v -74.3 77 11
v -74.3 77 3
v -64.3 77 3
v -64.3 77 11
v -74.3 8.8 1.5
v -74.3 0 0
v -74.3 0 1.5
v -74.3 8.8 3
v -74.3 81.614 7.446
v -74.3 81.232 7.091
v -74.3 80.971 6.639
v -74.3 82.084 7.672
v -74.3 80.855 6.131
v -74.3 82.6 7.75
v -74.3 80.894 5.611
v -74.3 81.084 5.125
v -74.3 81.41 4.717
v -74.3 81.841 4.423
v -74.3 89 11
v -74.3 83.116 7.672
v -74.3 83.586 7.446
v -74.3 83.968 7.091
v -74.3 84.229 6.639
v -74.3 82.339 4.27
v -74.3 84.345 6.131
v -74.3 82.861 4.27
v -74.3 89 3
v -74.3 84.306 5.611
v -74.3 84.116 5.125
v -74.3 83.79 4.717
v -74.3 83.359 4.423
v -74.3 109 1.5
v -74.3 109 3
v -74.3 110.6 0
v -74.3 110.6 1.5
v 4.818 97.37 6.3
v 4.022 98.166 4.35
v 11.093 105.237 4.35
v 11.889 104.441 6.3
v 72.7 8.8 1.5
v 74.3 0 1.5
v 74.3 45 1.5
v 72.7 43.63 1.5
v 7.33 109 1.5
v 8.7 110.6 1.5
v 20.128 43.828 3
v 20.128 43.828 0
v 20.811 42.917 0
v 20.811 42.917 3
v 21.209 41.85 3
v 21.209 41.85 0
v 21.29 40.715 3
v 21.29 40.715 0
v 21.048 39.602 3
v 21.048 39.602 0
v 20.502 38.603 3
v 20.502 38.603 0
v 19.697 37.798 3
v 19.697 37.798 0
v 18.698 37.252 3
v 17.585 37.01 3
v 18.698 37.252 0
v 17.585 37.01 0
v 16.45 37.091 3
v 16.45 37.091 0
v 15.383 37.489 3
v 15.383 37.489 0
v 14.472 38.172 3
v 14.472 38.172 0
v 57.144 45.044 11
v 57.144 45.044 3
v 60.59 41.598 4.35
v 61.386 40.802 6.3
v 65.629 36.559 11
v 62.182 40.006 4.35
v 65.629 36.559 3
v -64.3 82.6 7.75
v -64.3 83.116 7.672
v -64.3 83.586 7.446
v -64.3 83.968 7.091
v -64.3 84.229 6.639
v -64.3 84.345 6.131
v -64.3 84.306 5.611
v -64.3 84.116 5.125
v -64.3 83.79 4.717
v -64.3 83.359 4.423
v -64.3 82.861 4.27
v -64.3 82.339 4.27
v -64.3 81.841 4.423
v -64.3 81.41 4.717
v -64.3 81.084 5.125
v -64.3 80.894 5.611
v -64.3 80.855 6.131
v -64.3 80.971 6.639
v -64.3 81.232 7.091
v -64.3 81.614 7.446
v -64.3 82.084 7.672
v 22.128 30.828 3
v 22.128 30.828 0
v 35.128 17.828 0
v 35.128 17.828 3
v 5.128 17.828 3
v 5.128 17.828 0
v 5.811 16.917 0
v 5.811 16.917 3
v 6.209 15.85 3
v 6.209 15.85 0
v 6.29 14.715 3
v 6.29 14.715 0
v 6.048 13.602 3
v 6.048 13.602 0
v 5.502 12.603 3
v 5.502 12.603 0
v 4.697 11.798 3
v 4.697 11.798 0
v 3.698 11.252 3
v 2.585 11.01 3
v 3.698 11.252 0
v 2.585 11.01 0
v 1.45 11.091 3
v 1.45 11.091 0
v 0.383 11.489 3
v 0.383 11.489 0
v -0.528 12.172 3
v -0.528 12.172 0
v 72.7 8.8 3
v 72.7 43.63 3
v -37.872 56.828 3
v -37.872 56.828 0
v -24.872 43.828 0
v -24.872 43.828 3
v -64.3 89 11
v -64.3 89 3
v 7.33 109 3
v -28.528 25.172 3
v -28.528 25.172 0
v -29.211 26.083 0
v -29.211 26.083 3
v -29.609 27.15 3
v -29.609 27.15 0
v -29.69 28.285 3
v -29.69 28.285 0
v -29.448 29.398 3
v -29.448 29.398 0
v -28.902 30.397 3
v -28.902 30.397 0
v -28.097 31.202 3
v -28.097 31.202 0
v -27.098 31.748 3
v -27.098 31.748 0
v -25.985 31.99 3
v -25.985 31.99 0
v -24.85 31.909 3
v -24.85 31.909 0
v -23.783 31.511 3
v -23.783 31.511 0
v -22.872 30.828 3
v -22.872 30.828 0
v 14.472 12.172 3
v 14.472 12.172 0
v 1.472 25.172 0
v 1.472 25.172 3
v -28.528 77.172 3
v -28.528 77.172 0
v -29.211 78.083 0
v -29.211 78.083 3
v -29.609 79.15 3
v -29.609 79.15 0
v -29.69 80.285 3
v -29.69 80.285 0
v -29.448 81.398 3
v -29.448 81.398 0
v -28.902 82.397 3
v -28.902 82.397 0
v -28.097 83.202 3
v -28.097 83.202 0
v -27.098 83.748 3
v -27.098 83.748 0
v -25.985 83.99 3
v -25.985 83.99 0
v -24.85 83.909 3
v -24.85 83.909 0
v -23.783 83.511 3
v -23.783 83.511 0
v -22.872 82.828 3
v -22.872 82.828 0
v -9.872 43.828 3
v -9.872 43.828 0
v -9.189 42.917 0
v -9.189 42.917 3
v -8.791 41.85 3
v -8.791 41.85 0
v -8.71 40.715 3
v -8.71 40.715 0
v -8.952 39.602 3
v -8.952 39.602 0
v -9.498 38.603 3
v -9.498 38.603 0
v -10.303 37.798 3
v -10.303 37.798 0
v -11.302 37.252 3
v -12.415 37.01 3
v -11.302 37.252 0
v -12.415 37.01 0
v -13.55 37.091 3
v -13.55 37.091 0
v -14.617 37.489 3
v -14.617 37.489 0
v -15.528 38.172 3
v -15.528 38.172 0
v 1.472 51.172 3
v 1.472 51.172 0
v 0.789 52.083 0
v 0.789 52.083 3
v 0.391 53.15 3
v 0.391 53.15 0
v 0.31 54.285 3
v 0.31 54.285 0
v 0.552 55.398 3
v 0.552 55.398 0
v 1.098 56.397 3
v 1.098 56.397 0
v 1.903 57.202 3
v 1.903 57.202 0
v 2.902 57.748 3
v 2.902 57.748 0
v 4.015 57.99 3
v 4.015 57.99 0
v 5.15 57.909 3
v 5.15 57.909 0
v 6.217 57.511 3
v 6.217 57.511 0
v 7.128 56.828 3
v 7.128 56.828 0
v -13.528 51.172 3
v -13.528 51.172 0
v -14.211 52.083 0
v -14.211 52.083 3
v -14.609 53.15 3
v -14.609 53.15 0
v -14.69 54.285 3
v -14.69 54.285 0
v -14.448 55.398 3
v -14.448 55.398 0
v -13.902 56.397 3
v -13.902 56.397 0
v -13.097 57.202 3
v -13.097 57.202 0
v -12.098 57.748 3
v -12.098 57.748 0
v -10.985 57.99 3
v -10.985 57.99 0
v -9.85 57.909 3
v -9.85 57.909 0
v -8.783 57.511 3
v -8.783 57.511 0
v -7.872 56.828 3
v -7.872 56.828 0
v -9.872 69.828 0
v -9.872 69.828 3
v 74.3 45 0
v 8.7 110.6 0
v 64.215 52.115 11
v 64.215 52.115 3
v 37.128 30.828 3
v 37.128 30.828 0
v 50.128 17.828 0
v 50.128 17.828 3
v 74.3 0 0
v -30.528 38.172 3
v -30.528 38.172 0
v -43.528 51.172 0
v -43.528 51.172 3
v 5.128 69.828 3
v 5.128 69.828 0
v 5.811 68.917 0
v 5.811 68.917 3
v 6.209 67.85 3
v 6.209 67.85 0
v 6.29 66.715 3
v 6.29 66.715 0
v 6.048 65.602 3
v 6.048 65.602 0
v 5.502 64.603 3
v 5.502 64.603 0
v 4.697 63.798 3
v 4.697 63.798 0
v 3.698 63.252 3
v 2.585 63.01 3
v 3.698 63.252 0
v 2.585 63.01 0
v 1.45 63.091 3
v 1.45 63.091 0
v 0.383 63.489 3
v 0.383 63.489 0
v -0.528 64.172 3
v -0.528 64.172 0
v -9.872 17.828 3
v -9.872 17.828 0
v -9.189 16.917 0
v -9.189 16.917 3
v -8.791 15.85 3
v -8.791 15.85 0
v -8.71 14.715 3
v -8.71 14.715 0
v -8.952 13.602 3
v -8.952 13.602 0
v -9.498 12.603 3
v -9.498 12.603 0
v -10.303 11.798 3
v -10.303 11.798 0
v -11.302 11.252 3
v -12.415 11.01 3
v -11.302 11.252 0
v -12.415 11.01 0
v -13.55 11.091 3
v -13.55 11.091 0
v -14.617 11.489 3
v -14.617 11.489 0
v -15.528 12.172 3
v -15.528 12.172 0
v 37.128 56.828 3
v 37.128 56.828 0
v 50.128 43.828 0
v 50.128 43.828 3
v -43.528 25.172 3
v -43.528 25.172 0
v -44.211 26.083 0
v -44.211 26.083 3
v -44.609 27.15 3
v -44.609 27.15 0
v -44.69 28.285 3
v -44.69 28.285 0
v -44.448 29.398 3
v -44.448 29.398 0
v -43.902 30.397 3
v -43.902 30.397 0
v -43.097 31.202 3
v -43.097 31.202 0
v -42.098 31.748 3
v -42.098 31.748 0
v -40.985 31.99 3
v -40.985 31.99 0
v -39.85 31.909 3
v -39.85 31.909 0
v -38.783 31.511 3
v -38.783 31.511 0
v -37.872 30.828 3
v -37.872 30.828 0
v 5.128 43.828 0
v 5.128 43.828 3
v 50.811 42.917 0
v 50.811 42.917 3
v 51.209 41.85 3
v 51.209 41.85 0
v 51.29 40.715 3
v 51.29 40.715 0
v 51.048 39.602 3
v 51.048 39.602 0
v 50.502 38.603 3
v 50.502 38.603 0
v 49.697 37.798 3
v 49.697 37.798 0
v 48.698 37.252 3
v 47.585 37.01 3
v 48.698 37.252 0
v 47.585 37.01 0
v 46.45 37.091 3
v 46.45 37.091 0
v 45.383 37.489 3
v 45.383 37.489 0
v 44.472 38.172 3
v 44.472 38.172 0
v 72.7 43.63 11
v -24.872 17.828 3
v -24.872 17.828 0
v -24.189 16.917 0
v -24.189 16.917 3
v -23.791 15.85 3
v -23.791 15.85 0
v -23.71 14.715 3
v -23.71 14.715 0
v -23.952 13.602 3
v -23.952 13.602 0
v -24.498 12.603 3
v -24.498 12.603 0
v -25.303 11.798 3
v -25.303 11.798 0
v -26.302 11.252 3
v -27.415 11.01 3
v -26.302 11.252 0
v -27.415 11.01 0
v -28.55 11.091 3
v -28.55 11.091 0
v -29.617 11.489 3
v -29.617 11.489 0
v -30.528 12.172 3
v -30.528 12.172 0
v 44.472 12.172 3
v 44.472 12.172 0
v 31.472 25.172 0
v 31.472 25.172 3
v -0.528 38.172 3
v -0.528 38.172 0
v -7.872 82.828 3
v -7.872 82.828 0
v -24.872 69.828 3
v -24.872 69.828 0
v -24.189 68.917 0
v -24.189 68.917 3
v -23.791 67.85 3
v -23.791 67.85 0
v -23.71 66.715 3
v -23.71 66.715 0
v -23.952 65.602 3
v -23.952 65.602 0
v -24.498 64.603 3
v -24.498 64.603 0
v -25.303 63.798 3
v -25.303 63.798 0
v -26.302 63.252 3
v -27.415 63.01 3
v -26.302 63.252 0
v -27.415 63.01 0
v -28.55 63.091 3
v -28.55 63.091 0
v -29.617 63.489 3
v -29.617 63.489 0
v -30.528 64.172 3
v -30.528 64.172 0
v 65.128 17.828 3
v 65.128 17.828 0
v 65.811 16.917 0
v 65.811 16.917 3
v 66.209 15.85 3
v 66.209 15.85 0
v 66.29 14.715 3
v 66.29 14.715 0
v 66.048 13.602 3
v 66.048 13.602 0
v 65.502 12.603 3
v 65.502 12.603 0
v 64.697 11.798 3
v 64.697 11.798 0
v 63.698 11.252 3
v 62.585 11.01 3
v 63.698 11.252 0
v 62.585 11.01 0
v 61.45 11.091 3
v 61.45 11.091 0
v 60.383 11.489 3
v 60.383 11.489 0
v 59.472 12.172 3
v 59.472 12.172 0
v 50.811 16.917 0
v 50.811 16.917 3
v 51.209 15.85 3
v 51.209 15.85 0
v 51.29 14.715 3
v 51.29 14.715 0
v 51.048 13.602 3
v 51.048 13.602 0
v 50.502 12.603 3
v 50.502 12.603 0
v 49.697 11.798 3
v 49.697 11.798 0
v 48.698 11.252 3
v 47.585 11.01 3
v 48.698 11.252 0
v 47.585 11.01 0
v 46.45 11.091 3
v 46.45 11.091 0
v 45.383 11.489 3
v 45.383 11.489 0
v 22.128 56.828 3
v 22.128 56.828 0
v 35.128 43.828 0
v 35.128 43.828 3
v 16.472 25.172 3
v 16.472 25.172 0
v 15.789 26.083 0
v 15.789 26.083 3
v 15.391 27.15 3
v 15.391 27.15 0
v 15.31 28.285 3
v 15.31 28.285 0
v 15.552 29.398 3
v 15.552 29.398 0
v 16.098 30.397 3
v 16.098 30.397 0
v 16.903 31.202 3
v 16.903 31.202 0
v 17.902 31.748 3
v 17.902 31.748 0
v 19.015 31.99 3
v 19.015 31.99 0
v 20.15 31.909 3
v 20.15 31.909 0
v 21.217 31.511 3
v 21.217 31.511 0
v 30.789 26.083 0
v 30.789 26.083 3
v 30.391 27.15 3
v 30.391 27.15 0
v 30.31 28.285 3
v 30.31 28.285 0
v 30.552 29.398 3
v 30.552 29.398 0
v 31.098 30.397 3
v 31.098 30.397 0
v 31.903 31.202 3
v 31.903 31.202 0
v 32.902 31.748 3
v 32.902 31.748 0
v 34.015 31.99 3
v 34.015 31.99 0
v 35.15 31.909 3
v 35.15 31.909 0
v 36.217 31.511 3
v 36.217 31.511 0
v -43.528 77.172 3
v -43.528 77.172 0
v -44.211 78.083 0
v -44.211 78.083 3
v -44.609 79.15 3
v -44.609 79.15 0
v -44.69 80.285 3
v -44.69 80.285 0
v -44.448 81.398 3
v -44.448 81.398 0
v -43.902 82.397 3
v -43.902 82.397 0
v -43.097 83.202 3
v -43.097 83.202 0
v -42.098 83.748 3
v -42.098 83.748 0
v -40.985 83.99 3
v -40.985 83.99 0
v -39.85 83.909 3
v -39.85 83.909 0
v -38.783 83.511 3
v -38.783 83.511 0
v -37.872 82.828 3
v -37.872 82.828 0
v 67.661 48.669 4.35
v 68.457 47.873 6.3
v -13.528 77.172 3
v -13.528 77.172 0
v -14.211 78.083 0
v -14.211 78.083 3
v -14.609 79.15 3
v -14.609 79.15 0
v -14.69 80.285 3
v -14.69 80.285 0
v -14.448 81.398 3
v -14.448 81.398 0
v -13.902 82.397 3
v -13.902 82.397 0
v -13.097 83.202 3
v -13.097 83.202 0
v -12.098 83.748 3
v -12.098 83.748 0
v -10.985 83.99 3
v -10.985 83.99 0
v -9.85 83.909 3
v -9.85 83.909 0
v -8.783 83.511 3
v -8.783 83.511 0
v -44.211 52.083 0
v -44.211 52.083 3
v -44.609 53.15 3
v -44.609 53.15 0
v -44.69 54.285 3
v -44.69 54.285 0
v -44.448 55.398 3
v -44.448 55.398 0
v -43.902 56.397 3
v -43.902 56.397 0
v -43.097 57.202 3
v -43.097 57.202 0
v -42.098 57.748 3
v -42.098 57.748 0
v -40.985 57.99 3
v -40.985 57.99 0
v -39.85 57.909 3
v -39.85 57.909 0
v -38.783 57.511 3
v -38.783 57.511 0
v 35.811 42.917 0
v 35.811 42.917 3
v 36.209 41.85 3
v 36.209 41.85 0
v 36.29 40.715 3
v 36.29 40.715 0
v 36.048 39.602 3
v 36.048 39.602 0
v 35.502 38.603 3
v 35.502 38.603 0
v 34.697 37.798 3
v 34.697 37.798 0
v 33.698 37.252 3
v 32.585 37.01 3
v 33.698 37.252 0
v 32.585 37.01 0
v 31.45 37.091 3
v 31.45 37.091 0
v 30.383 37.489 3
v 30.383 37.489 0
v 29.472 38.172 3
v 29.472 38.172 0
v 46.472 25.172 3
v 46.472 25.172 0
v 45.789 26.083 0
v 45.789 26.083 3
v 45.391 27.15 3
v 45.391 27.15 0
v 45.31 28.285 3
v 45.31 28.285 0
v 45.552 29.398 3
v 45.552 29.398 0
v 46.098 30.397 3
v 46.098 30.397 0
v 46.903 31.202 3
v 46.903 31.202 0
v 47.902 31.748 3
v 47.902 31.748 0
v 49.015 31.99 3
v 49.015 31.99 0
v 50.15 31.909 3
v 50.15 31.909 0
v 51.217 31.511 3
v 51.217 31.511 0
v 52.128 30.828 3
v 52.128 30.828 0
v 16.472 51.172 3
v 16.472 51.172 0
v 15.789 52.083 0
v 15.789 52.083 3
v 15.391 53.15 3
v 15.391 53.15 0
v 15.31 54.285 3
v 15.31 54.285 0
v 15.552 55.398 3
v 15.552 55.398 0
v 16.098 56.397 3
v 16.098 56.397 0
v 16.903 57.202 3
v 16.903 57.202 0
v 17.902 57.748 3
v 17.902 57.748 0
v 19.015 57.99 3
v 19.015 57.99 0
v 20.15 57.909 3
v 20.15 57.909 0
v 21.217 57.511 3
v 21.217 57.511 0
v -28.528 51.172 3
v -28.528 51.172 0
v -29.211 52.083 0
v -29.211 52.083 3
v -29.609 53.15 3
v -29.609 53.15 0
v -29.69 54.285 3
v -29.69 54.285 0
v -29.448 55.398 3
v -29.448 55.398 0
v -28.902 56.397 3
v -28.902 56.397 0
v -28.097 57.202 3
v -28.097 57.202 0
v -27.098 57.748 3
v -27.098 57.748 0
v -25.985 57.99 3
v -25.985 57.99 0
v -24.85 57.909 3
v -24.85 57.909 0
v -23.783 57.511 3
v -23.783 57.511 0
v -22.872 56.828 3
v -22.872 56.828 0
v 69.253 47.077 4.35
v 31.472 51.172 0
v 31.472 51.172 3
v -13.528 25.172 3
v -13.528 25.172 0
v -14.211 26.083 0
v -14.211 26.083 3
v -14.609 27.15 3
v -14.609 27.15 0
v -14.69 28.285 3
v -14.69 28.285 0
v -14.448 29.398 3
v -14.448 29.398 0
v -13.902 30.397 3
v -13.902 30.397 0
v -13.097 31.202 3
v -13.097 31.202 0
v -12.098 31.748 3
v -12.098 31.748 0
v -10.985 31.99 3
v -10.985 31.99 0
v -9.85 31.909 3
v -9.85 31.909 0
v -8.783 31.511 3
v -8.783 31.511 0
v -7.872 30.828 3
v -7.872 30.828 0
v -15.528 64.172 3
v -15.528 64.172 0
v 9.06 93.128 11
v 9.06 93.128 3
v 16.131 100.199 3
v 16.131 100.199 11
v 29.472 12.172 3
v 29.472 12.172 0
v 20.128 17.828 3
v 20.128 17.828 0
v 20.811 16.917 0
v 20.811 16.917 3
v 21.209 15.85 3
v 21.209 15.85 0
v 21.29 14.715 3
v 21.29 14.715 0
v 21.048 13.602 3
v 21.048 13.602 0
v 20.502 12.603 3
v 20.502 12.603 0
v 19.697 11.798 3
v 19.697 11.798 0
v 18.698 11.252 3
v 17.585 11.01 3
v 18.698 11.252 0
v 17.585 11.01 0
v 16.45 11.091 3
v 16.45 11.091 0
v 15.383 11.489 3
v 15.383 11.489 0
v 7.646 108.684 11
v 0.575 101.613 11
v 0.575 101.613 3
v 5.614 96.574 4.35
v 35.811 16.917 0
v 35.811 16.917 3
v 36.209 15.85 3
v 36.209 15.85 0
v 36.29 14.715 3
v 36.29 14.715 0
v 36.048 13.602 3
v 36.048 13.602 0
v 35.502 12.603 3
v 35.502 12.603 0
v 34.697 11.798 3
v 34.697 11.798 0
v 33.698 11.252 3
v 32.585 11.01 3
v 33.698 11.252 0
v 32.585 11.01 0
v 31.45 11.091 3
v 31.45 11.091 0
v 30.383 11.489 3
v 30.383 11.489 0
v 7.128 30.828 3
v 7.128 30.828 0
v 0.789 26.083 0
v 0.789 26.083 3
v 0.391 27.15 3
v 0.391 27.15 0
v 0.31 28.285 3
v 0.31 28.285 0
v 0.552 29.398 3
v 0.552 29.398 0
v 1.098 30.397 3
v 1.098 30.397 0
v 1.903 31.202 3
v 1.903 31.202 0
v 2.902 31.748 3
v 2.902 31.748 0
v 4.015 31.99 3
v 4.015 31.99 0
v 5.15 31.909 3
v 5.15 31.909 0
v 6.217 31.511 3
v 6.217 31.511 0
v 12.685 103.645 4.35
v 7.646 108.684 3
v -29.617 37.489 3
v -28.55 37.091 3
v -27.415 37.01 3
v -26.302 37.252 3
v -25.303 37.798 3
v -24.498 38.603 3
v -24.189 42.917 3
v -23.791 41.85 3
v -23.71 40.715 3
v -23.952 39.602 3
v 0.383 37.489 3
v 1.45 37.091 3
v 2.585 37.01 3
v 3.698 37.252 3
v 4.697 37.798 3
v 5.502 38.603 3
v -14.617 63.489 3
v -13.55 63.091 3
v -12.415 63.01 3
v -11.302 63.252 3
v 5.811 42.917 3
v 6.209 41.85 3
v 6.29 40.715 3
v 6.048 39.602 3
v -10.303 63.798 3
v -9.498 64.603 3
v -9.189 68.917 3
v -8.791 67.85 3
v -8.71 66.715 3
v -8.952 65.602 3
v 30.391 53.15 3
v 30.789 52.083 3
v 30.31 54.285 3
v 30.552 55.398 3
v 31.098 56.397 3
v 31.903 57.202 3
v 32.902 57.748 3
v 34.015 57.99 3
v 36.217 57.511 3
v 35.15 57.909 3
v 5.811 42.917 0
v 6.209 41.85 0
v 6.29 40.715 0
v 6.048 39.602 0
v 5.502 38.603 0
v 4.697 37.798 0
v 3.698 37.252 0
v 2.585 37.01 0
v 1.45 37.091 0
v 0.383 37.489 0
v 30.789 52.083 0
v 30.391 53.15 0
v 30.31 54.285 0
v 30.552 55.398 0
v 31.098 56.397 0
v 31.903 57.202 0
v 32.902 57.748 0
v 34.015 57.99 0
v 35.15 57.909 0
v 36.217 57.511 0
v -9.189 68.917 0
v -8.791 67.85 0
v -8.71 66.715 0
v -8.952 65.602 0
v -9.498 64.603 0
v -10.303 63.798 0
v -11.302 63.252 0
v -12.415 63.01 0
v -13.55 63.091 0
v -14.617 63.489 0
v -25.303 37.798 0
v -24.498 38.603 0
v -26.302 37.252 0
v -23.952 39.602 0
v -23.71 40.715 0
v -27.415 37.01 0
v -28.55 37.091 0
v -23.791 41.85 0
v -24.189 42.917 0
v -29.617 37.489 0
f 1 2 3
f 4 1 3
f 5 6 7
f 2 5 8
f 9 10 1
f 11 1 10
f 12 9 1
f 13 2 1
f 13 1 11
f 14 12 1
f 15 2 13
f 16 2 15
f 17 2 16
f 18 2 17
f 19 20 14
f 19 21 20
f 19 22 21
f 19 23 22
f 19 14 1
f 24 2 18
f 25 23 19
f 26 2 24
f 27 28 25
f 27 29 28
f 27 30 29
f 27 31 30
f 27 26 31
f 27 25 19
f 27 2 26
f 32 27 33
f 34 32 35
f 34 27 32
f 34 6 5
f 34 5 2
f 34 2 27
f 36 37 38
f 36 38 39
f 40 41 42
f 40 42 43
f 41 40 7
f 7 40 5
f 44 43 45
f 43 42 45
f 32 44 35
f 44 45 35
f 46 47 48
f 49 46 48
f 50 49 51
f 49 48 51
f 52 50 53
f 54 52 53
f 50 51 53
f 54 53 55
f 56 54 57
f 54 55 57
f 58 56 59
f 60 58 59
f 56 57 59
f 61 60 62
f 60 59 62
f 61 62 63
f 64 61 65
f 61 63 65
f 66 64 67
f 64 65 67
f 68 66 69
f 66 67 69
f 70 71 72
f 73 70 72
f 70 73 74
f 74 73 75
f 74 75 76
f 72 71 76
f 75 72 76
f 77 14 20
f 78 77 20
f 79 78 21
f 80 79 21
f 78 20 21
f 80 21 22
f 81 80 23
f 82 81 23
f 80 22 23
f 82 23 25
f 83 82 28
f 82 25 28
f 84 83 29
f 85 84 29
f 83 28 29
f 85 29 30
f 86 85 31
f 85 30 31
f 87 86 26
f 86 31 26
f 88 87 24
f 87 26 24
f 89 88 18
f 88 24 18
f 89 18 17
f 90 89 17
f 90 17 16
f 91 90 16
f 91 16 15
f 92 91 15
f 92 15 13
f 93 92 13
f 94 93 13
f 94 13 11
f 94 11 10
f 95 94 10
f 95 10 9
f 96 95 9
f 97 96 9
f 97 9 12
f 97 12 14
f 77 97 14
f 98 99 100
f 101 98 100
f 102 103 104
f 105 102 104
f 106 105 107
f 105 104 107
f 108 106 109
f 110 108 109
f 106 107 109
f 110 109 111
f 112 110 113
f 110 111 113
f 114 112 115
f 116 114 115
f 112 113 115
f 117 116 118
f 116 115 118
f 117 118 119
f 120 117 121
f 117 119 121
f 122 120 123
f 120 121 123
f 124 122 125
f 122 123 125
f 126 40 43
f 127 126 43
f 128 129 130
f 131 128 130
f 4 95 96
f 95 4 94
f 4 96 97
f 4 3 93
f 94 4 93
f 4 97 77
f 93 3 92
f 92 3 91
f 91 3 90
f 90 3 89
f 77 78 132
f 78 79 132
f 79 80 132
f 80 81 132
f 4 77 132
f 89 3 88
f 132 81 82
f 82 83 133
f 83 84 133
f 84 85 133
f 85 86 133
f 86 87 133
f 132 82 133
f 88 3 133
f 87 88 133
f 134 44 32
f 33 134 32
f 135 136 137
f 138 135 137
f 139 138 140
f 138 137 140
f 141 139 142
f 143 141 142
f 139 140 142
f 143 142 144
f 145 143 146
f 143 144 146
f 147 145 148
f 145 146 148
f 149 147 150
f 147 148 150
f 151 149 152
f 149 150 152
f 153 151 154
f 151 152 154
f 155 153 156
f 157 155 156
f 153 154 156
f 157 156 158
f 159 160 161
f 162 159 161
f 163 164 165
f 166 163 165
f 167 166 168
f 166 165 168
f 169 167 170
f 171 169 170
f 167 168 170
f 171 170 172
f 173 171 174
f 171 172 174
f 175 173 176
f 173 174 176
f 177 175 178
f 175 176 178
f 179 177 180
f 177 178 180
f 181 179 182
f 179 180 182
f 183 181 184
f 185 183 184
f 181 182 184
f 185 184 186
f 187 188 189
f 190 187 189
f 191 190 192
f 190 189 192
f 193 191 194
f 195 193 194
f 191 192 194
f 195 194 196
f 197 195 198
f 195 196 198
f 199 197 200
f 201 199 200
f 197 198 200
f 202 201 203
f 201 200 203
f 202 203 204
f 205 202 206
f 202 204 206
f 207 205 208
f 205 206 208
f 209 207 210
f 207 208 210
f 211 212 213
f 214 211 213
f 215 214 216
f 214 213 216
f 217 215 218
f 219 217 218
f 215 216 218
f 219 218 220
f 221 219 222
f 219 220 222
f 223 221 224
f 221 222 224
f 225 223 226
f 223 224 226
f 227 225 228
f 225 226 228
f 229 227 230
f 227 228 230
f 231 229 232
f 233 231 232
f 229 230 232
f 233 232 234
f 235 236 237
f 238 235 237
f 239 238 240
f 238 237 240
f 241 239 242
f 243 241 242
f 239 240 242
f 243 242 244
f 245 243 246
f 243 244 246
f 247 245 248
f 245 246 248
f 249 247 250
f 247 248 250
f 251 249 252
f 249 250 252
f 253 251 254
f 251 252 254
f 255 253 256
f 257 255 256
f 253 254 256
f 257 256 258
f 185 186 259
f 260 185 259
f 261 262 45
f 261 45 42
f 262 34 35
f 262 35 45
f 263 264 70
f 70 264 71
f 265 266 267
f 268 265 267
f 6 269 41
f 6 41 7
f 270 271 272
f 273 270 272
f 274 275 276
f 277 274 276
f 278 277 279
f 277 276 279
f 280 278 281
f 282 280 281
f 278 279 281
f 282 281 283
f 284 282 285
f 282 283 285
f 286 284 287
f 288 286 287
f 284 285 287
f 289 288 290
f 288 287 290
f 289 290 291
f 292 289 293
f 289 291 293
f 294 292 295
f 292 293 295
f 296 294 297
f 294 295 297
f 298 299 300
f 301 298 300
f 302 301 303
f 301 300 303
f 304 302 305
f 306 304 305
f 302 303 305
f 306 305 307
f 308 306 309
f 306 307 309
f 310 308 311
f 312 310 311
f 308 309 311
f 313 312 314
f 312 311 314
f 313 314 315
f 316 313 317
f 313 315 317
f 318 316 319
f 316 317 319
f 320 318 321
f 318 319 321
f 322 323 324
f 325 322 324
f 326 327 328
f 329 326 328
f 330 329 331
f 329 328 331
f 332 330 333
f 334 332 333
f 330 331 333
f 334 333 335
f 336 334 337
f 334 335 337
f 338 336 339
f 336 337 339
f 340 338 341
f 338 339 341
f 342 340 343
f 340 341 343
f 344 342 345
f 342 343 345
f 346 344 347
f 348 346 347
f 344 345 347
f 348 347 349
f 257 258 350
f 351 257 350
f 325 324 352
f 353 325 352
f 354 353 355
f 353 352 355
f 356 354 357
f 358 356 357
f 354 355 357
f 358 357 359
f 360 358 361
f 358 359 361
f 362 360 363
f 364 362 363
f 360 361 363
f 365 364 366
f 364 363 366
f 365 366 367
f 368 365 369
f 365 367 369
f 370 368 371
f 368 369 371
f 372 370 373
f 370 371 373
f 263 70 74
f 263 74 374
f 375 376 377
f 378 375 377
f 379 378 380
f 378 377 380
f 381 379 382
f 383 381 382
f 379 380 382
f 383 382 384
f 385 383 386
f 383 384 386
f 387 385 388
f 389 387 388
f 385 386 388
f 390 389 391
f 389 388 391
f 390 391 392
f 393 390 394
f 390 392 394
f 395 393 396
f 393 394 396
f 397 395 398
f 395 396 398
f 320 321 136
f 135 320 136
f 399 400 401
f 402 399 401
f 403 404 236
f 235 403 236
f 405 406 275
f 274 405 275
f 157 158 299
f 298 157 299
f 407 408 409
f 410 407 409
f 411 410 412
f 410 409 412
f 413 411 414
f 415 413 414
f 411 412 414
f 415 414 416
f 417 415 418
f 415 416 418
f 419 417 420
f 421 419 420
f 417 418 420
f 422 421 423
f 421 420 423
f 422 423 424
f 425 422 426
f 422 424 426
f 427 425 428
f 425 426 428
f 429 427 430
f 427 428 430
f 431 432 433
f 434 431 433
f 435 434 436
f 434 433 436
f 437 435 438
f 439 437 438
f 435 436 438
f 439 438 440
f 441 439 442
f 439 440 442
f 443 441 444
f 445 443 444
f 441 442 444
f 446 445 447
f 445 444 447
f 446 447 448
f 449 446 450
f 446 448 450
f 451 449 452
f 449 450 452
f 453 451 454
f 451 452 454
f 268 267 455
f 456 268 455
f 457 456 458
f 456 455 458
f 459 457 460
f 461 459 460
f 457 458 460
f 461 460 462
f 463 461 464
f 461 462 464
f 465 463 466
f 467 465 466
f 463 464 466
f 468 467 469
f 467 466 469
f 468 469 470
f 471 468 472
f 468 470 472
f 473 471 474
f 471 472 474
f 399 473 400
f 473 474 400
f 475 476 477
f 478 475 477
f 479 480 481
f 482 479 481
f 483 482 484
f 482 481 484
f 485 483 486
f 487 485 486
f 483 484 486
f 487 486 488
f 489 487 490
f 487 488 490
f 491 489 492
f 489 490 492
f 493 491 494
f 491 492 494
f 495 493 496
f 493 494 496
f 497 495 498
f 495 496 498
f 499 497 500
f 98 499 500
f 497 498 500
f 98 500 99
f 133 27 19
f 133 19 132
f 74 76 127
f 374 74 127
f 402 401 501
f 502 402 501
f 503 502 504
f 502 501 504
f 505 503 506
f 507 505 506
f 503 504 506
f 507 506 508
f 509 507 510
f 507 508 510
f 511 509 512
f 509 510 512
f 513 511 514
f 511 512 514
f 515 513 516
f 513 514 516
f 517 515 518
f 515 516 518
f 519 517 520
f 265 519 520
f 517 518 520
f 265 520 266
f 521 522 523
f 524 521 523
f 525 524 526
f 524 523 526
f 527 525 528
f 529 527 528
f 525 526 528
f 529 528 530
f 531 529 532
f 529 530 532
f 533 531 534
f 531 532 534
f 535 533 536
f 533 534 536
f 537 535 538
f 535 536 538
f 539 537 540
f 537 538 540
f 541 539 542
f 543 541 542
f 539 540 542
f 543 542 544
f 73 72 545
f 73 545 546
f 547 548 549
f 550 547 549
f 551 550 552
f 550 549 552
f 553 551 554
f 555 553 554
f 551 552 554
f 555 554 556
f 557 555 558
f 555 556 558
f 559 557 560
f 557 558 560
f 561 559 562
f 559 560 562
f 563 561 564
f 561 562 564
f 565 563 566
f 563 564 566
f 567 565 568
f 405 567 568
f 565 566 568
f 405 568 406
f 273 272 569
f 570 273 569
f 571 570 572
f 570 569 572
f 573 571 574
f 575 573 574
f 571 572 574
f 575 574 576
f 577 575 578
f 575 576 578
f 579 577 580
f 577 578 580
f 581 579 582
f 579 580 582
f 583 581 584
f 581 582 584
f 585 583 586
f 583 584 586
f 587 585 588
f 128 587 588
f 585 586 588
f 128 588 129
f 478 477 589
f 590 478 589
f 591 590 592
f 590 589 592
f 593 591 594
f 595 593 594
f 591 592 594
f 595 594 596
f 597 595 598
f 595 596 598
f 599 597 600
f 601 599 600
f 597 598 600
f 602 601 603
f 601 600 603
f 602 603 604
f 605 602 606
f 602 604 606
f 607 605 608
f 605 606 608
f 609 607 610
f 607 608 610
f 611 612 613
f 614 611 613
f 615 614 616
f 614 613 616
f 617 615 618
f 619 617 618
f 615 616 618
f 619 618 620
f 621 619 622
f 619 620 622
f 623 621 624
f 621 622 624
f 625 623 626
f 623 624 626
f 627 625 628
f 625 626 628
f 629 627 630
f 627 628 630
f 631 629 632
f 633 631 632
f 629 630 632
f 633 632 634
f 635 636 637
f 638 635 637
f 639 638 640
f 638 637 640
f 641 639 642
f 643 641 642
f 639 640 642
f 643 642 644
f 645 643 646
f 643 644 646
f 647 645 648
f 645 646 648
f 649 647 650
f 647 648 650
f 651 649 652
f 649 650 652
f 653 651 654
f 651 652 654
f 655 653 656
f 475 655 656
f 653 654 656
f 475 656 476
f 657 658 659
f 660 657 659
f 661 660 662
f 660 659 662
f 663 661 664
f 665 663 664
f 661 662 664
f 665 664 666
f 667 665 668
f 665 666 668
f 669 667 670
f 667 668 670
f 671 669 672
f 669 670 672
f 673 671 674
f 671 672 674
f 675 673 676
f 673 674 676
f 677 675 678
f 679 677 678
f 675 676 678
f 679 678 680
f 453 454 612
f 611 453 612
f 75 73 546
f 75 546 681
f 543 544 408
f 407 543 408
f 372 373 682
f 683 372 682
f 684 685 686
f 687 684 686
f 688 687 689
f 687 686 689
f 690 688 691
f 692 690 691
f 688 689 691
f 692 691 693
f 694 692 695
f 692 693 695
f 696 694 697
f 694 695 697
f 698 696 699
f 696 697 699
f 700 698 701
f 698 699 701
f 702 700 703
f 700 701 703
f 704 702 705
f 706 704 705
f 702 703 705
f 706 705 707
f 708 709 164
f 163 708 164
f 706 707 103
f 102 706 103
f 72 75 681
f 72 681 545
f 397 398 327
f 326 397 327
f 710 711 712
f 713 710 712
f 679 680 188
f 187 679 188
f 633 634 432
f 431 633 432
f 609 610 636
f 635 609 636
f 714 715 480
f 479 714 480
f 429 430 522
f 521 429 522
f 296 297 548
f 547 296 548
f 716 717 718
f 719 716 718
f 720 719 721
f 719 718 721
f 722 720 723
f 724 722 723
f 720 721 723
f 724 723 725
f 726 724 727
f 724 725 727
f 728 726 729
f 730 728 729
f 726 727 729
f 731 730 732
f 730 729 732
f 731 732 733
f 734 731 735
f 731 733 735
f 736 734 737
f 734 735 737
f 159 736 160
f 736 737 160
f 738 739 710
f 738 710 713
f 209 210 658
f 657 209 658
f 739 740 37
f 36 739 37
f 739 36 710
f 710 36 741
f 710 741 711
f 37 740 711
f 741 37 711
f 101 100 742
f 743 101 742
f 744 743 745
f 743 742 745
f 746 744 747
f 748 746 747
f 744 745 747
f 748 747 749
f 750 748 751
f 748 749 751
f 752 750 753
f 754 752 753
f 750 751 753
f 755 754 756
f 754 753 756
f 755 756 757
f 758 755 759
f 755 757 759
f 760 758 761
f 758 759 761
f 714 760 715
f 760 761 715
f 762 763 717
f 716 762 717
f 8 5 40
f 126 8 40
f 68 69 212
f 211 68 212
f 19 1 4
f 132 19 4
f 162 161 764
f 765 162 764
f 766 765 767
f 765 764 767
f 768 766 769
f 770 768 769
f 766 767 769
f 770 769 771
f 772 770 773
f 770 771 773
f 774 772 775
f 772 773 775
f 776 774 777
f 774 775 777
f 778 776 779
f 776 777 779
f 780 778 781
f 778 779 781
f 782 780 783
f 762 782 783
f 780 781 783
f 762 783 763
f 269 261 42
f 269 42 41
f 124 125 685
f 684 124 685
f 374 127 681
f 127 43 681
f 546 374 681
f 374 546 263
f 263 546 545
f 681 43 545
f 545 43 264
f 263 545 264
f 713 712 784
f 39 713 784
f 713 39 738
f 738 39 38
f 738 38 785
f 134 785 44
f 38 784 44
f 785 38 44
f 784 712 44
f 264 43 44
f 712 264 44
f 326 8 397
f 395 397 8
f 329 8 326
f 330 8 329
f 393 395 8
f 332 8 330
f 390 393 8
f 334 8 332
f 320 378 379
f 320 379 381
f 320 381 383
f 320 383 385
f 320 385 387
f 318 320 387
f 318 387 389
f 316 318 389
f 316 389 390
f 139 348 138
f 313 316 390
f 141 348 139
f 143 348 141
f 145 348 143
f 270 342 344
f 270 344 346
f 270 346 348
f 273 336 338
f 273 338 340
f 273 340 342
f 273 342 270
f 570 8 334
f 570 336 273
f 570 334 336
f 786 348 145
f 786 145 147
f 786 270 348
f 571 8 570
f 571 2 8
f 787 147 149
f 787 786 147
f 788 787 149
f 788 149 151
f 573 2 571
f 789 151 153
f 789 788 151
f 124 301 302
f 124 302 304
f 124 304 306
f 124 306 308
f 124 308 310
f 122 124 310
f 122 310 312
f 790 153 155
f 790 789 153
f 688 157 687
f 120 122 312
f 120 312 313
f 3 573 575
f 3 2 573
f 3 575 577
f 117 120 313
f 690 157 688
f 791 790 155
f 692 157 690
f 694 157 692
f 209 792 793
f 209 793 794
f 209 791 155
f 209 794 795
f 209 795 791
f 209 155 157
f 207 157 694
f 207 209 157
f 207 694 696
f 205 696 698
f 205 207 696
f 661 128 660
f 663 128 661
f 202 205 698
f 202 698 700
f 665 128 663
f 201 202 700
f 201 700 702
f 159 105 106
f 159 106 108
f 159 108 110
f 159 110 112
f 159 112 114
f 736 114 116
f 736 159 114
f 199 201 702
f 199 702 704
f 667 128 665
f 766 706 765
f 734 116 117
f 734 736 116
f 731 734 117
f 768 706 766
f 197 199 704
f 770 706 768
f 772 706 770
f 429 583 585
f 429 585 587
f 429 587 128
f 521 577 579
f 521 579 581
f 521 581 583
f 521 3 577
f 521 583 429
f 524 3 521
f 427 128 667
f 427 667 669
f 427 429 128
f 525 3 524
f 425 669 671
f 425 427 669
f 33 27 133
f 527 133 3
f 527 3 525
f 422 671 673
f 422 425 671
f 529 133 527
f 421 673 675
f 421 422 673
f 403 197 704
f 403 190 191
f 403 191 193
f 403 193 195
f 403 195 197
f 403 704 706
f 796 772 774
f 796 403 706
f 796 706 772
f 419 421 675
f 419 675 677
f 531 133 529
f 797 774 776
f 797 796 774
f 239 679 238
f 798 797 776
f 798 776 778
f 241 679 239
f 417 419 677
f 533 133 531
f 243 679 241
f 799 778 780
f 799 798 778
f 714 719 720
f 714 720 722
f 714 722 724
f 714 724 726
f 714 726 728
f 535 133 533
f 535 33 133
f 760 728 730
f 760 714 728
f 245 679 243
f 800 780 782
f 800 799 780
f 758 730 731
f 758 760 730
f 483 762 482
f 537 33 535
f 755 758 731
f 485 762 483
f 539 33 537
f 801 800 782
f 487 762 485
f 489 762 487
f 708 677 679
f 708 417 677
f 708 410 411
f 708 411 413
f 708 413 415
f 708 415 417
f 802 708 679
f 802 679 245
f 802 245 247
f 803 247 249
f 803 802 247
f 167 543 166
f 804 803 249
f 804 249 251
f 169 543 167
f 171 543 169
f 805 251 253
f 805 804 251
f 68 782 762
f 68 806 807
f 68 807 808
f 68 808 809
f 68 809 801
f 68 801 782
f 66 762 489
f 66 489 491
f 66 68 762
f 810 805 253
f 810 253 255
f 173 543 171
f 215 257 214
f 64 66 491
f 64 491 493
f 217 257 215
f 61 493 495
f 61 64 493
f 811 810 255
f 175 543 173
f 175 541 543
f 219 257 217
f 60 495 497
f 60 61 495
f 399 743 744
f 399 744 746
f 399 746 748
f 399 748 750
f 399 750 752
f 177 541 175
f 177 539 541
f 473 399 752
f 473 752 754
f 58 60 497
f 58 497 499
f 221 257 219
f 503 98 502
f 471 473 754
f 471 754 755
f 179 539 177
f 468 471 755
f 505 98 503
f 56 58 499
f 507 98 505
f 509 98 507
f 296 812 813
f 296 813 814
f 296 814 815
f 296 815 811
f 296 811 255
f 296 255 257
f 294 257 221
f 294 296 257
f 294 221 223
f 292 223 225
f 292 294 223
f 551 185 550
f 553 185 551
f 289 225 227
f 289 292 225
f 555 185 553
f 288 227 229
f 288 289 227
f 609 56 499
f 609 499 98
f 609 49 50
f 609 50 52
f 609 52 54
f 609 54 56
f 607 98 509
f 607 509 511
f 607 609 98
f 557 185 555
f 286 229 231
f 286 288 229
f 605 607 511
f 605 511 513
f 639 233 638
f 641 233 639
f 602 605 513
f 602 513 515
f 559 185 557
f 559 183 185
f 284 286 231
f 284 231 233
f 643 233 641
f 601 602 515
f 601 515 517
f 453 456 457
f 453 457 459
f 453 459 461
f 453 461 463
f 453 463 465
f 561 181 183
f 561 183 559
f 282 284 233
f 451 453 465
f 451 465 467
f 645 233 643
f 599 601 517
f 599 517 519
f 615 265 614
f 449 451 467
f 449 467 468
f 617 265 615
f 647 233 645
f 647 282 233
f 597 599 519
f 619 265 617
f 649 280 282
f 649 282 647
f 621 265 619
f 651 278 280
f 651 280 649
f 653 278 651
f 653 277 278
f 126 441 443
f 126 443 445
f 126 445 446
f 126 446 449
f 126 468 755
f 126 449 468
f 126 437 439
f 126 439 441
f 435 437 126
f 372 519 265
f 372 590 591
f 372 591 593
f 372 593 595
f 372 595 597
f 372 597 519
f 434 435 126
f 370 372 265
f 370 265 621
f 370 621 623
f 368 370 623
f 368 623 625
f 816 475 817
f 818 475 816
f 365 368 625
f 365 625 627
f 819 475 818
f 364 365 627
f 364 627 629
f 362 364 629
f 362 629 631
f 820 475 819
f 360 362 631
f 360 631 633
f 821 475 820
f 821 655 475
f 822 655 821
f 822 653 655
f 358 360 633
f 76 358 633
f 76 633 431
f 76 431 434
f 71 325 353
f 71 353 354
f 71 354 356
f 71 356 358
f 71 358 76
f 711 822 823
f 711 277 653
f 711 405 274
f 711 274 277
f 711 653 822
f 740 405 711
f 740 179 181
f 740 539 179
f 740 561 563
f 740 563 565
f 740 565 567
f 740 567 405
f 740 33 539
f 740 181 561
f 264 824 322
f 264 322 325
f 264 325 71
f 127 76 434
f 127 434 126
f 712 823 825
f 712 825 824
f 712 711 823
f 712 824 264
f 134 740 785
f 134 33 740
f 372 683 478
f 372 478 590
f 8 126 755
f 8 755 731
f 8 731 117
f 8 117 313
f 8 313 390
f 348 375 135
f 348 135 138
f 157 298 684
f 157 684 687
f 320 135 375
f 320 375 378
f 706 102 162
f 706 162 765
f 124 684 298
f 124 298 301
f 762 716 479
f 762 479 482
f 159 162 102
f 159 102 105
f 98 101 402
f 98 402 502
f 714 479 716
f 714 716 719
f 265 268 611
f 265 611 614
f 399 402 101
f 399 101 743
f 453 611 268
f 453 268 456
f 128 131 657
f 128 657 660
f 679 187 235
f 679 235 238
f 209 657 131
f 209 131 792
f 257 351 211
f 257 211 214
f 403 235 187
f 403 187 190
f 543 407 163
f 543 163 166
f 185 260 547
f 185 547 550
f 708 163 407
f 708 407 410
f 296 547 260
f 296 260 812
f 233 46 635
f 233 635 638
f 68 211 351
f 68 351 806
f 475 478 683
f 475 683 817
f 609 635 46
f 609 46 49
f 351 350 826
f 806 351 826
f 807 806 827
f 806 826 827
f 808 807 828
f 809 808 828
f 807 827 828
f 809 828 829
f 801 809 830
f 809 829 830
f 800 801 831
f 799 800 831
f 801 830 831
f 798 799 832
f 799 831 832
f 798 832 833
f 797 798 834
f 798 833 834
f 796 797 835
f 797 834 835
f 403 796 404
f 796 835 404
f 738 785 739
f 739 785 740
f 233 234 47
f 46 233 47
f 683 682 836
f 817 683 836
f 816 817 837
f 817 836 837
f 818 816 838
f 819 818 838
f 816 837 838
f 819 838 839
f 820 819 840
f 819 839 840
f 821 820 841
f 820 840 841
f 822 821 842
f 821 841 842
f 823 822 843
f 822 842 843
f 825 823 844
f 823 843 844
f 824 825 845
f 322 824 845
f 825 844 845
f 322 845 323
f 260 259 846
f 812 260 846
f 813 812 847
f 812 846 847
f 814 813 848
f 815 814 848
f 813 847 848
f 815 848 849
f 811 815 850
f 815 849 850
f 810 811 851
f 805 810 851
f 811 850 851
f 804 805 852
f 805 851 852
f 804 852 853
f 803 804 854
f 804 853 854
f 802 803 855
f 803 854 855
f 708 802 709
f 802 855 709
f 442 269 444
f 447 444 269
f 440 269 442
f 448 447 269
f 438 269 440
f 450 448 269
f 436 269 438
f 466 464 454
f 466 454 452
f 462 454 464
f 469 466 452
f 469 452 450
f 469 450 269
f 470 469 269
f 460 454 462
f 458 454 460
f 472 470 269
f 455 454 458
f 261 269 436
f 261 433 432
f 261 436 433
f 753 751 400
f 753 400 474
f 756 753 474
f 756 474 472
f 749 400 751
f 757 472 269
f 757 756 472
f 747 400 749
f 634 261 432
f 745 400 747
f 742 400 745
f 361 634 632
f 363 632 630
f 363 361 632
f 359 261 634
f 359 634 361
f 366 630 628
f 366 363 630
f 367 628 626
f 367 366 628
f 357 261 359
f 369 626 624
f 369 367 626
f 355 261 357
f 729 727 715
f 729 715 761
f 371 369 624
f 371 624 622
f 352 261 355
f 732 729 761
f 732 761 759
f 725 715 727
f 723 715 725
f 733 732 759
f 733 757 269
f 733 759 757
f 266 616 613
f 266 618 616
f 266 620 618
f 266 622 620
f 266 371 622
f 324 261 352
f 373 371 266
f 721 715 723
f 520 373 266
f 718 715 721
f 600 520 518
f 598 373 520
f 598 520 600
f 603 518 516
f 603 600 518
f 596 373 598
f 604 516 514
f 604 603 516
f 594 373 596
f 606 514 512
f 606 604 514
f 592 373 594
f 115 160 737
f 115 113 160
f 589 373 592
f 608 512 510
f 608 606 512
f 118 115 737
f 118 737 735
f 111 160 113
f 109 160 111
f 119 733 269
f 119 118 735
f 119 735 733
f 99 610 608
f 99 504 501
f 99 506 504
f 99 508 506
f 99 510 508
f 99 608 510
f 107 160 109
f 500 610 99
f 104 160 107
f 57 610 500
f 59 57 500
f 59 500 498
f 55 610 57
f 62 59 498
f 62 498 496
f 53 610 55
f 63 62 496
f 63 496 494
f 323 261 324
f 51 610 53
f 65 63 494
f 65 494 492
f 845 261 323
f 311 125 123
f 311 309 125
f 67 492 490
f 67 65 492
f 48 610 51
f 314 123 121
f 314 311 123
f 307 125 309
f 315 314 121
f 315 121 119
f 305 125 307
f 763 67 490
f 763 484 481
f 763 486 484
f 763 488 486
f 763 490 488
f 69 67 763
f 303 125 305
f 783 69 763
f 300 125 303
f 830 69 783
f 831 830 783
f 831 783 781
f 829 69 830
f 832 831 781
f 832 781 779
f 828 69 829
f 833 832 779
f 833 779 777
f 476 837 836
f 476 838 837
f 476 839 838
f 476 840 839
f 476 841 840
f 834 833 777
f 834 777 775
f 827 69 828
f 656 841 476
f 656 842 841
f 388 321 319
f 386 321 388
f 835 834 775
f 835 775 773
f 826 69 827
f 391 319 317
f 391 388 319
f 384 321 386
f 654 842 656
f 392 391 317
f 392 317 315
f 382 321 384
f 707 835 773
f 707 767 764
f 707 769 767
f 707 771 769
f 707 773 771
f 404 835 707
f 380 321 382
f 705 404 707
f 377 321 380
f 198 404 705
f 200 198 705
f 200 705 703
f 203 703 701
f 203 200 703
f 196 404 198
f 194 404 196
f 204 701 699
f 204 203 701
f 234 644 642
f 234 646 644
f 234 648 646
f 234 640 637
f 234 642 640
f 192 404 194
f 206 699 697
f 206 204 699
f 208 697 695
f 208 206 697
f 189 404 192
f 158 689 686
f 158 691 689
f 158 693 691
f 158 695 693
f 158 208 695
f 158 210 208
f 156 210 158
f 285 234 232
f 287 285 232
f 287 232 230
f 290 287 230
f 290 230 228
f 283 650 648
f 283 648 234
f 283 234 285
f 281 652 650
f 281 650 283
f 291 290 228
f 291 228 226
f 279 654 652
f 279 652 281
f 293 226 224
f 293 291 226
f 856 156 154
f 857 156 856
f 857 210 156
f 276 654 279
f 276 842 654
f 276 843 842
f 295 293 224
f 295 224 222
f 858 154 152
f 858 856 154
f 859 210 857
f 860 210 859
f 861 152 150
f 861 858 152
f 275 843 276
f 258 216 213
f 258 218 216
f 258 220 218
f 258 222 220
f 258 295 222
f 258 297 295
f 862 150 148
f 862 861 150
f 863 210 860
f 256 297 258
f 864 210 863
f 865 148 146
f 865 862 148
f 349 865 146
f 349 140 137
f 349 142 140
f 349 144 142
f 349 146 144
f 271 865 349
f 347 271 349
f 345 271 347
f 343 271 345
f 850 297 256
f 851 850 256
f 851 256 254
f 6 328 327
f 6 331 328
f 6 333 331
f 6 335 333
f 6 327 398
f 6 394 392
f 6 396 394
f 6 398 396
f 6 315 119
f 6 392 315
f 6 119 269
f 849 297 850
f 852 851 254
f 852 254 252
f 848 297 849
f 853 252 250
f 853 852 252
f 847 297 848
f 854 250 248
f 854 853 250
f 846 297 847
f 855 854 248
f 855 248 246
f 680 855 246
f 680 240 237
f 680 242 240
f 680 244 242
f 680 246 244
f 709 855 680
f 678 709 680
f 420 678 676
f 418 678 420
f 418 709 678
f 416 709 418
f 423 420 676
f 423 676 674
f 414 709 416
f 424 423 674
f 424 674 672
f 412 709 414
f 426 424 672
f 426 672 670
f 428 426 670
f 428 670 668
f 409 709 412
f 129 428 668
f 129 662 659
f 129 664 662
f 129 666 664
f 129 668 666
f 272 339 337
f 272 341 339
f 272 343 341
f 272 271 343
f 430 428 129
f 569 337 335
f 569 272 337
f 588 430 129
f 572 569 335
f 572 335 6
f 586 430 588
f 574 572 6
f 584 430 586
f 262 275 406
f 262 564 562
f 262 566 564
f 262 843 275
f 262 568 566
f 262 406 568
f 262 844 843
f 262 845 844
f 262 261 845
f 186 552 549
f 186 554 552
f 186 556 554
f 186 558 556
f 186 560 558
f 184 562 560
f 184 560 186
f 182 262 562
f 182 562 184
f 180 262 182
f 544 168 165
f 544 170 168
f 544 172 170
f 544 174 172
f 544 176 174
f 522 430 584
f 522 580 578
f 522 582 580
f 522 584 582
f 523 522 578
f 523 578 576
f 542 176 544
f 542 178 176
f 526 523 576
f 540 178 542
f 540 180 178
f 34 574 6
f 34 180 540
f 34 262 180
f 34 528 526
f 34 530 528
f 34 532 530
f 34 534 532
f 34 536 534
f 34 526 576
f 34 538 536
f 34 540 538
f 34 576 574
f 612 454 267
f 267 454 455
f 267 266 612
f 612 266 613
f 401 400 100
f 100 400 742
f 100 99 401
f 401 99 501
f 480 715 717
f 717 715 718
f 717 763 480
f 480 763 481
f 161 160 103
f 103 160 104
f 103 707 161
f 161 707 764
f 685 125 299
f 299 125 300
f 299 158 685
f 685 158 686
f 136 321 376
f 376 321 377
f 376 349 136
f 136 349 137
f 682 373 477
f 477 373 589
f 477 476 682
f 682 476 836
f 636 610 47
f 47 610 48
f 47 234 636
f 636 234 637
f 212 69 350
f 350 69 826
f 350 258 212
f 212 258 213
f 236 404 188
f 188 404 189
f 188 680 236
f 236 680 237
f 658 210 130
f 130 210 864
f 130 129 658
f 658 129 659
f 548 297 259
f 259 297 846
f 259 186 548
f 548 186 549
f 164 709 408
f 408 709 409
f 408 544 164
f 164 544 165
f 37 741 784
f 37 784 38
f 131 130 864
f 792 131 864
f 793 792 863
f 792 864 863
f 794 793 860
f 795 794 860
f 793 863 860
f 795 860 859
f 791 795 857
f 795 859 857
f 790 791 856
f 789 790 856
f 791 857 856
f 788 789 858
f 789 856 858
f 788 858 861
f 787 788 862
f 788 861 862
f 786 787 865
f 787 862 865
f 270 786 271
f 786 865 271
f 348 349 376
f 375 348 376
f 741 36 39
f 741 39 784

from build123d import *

# Parameters (mm, degrees)
SALIENTE_EXTRUIR1_DEPTH = 1.5
SALIENTE_EXTRUIR2_DEPTH = 1.5
VENTILACION_DEPTH       = 3
MATRIZL1_COUNT          = 7
MATRIZL1_PITCH          = 15
MATRIZL1_COUNT_DIR2     = 3
MATRIZL1_PITCH_DIR2     = 26
CROQUIS4_W              = 10
CROQUIS4_H              = 12
SALIENTE_EXTRUIR3_DEPTH = 8
FIX_SUP_REACH           = 150.6
CROQUIS5_R              = 1.75
SALIENTE_EXTRUIR4_DEPTH = 8
CORTAR_EXTRUIR4_DEPTH   = 10
MATRIZL2_COUNT          = 2
MATRIZL2_PITCH          = 80


with BuildPart() as part:
    # Croquis1 → Saliente-Extruir1 (new body)
    with BuildSketch(Plane.XY):
        Polygon((74.3, 0), (-74.3, 0), (-74.3, 110.6), (8.7, 110.6), (74.3, 45), align=None)
    extrude(amount=SALIENTE_EXTRUIR1_DEPTH)

    # Croquis2 → Saliente-Extruir2 (add)
    with BuildSketch(Plane.XY.offset(1.5)):
        Polygon((-74.3, 109), (-74.3, 8.8), (72.7, 8.8), (72.7, 43.630151519), (7.330151519, 109), align=None)
    extrude(amount=SALIENTE_EXTRUIR2_DEPTH)

    # Croquis3 → ventilacion (cut)
    with BuildSketch(Plane.XY):
        with BuildLine():
            Line((52.128427125, 30.828427125), (65.128427125, 17.828427125))
            ThreePointArc((65.128427125, 17.828427125), (65.128427125, 12.171572875), (59.471572875, 12.171572875))
            Line((59.471572875, 12.171572875), (46.471572875, 25.171572875))
            ThreePointArc((46.471572875, 25.171572875), (46.471572875, 30.828427125), (52.128427125, 30.828427125))
        make_face()
    ventilacion = extrude(amount=VENTILACION_DEPTH, mode=Mode.SUBTRACT)

    # MatrizL1: ventilacion 7 × 3, 5 skipped
    with Locations(*[(-i * MATRIZL1_PITCH, j * MATRIZL1_PITCH_DIR2, 0) for i in range(MATRIZL1_COUNT) for j in range(MATRIZL1_COUNT_DIR2) if (i, j) not in ((0, 0), (0, 1), (0, 2), (1, 2), (2, 2), (3, 2))]):
        add(ventilacion, mode=Mode.SUBTRACT)

    # Croquis4 → Saliente-Extruir3 (add)
    with BuildSketch(Plane.XY.offset(3)):
        with Locations((-69.3, 83)):
            Rectangle(CROQUIS4_W, CROQUIS4_H)
    extrude(amount=SALIENTE_EXTRUIR3_DEPTH)

    # Croquis5 → fix-sup (cut, up to next)
    with BuildSketch(Plane.ZY.offset(74.3), mode=Mode.PRIVATE) as fix_sup_sk1:
        with Locations((6, 82.6)):
            Circle(CROQUIS5_R)
    fix_sup_tool1 = extrude(fix_sup_sk1.sketch, amount=-FIX_SUP_REACH, mode=Mode.PRIVATE) & part.part
    add(fix_sup_tool1.solids().sort_by_distance((-74.3, 82.6, 6))[0], mode=Mode.SUBTRACT)

    # Croquis6 → Saliente-Extruir4 (add)
    with BuildSketch(Plane.XY.offset(3)):
        Polygon((72.7, 43.630151519), (64.214718626, 52.115432893), (57.143650814, 45.044365081), (65.628932188, 36.559083707), align=None)
    saliente_extruir4 = extrude(amount=SALIENTE_EXTRUIR4_DEPTH)

    # Croquis7 → Cortar-Extruir4 (cut)
    with BuildSketch(Plane(origin=(58.16507576, 58.16507576, 0), x_dir=(0, 0, -1), z_dir=(0.707106781, 0.707106781, 0))):
        Polygon((-4.35, -13.429653964), (-6.3, -14.555486989), (-4.35, -15.681320014), align=None)
    cortar_extruir4 = extrude(amount=-CORTAR_EXTRUIR4_DEPTH, mode=Mode.SUBTRACT)

    # MatrizL2: Saliente-Extruir4, Cortar-Extruir4 ×2
    with Locations(*[Vector(-0.707106781, 0.707106781, 0) * (i * MATRIZL2_PITCH) for i in range(1, MATRIZL2_COUNT)]):
        add(saliente_extruir4)
        add(cortar_extruir4, mode=Mode.SUBTRACT)


solid = part.part
